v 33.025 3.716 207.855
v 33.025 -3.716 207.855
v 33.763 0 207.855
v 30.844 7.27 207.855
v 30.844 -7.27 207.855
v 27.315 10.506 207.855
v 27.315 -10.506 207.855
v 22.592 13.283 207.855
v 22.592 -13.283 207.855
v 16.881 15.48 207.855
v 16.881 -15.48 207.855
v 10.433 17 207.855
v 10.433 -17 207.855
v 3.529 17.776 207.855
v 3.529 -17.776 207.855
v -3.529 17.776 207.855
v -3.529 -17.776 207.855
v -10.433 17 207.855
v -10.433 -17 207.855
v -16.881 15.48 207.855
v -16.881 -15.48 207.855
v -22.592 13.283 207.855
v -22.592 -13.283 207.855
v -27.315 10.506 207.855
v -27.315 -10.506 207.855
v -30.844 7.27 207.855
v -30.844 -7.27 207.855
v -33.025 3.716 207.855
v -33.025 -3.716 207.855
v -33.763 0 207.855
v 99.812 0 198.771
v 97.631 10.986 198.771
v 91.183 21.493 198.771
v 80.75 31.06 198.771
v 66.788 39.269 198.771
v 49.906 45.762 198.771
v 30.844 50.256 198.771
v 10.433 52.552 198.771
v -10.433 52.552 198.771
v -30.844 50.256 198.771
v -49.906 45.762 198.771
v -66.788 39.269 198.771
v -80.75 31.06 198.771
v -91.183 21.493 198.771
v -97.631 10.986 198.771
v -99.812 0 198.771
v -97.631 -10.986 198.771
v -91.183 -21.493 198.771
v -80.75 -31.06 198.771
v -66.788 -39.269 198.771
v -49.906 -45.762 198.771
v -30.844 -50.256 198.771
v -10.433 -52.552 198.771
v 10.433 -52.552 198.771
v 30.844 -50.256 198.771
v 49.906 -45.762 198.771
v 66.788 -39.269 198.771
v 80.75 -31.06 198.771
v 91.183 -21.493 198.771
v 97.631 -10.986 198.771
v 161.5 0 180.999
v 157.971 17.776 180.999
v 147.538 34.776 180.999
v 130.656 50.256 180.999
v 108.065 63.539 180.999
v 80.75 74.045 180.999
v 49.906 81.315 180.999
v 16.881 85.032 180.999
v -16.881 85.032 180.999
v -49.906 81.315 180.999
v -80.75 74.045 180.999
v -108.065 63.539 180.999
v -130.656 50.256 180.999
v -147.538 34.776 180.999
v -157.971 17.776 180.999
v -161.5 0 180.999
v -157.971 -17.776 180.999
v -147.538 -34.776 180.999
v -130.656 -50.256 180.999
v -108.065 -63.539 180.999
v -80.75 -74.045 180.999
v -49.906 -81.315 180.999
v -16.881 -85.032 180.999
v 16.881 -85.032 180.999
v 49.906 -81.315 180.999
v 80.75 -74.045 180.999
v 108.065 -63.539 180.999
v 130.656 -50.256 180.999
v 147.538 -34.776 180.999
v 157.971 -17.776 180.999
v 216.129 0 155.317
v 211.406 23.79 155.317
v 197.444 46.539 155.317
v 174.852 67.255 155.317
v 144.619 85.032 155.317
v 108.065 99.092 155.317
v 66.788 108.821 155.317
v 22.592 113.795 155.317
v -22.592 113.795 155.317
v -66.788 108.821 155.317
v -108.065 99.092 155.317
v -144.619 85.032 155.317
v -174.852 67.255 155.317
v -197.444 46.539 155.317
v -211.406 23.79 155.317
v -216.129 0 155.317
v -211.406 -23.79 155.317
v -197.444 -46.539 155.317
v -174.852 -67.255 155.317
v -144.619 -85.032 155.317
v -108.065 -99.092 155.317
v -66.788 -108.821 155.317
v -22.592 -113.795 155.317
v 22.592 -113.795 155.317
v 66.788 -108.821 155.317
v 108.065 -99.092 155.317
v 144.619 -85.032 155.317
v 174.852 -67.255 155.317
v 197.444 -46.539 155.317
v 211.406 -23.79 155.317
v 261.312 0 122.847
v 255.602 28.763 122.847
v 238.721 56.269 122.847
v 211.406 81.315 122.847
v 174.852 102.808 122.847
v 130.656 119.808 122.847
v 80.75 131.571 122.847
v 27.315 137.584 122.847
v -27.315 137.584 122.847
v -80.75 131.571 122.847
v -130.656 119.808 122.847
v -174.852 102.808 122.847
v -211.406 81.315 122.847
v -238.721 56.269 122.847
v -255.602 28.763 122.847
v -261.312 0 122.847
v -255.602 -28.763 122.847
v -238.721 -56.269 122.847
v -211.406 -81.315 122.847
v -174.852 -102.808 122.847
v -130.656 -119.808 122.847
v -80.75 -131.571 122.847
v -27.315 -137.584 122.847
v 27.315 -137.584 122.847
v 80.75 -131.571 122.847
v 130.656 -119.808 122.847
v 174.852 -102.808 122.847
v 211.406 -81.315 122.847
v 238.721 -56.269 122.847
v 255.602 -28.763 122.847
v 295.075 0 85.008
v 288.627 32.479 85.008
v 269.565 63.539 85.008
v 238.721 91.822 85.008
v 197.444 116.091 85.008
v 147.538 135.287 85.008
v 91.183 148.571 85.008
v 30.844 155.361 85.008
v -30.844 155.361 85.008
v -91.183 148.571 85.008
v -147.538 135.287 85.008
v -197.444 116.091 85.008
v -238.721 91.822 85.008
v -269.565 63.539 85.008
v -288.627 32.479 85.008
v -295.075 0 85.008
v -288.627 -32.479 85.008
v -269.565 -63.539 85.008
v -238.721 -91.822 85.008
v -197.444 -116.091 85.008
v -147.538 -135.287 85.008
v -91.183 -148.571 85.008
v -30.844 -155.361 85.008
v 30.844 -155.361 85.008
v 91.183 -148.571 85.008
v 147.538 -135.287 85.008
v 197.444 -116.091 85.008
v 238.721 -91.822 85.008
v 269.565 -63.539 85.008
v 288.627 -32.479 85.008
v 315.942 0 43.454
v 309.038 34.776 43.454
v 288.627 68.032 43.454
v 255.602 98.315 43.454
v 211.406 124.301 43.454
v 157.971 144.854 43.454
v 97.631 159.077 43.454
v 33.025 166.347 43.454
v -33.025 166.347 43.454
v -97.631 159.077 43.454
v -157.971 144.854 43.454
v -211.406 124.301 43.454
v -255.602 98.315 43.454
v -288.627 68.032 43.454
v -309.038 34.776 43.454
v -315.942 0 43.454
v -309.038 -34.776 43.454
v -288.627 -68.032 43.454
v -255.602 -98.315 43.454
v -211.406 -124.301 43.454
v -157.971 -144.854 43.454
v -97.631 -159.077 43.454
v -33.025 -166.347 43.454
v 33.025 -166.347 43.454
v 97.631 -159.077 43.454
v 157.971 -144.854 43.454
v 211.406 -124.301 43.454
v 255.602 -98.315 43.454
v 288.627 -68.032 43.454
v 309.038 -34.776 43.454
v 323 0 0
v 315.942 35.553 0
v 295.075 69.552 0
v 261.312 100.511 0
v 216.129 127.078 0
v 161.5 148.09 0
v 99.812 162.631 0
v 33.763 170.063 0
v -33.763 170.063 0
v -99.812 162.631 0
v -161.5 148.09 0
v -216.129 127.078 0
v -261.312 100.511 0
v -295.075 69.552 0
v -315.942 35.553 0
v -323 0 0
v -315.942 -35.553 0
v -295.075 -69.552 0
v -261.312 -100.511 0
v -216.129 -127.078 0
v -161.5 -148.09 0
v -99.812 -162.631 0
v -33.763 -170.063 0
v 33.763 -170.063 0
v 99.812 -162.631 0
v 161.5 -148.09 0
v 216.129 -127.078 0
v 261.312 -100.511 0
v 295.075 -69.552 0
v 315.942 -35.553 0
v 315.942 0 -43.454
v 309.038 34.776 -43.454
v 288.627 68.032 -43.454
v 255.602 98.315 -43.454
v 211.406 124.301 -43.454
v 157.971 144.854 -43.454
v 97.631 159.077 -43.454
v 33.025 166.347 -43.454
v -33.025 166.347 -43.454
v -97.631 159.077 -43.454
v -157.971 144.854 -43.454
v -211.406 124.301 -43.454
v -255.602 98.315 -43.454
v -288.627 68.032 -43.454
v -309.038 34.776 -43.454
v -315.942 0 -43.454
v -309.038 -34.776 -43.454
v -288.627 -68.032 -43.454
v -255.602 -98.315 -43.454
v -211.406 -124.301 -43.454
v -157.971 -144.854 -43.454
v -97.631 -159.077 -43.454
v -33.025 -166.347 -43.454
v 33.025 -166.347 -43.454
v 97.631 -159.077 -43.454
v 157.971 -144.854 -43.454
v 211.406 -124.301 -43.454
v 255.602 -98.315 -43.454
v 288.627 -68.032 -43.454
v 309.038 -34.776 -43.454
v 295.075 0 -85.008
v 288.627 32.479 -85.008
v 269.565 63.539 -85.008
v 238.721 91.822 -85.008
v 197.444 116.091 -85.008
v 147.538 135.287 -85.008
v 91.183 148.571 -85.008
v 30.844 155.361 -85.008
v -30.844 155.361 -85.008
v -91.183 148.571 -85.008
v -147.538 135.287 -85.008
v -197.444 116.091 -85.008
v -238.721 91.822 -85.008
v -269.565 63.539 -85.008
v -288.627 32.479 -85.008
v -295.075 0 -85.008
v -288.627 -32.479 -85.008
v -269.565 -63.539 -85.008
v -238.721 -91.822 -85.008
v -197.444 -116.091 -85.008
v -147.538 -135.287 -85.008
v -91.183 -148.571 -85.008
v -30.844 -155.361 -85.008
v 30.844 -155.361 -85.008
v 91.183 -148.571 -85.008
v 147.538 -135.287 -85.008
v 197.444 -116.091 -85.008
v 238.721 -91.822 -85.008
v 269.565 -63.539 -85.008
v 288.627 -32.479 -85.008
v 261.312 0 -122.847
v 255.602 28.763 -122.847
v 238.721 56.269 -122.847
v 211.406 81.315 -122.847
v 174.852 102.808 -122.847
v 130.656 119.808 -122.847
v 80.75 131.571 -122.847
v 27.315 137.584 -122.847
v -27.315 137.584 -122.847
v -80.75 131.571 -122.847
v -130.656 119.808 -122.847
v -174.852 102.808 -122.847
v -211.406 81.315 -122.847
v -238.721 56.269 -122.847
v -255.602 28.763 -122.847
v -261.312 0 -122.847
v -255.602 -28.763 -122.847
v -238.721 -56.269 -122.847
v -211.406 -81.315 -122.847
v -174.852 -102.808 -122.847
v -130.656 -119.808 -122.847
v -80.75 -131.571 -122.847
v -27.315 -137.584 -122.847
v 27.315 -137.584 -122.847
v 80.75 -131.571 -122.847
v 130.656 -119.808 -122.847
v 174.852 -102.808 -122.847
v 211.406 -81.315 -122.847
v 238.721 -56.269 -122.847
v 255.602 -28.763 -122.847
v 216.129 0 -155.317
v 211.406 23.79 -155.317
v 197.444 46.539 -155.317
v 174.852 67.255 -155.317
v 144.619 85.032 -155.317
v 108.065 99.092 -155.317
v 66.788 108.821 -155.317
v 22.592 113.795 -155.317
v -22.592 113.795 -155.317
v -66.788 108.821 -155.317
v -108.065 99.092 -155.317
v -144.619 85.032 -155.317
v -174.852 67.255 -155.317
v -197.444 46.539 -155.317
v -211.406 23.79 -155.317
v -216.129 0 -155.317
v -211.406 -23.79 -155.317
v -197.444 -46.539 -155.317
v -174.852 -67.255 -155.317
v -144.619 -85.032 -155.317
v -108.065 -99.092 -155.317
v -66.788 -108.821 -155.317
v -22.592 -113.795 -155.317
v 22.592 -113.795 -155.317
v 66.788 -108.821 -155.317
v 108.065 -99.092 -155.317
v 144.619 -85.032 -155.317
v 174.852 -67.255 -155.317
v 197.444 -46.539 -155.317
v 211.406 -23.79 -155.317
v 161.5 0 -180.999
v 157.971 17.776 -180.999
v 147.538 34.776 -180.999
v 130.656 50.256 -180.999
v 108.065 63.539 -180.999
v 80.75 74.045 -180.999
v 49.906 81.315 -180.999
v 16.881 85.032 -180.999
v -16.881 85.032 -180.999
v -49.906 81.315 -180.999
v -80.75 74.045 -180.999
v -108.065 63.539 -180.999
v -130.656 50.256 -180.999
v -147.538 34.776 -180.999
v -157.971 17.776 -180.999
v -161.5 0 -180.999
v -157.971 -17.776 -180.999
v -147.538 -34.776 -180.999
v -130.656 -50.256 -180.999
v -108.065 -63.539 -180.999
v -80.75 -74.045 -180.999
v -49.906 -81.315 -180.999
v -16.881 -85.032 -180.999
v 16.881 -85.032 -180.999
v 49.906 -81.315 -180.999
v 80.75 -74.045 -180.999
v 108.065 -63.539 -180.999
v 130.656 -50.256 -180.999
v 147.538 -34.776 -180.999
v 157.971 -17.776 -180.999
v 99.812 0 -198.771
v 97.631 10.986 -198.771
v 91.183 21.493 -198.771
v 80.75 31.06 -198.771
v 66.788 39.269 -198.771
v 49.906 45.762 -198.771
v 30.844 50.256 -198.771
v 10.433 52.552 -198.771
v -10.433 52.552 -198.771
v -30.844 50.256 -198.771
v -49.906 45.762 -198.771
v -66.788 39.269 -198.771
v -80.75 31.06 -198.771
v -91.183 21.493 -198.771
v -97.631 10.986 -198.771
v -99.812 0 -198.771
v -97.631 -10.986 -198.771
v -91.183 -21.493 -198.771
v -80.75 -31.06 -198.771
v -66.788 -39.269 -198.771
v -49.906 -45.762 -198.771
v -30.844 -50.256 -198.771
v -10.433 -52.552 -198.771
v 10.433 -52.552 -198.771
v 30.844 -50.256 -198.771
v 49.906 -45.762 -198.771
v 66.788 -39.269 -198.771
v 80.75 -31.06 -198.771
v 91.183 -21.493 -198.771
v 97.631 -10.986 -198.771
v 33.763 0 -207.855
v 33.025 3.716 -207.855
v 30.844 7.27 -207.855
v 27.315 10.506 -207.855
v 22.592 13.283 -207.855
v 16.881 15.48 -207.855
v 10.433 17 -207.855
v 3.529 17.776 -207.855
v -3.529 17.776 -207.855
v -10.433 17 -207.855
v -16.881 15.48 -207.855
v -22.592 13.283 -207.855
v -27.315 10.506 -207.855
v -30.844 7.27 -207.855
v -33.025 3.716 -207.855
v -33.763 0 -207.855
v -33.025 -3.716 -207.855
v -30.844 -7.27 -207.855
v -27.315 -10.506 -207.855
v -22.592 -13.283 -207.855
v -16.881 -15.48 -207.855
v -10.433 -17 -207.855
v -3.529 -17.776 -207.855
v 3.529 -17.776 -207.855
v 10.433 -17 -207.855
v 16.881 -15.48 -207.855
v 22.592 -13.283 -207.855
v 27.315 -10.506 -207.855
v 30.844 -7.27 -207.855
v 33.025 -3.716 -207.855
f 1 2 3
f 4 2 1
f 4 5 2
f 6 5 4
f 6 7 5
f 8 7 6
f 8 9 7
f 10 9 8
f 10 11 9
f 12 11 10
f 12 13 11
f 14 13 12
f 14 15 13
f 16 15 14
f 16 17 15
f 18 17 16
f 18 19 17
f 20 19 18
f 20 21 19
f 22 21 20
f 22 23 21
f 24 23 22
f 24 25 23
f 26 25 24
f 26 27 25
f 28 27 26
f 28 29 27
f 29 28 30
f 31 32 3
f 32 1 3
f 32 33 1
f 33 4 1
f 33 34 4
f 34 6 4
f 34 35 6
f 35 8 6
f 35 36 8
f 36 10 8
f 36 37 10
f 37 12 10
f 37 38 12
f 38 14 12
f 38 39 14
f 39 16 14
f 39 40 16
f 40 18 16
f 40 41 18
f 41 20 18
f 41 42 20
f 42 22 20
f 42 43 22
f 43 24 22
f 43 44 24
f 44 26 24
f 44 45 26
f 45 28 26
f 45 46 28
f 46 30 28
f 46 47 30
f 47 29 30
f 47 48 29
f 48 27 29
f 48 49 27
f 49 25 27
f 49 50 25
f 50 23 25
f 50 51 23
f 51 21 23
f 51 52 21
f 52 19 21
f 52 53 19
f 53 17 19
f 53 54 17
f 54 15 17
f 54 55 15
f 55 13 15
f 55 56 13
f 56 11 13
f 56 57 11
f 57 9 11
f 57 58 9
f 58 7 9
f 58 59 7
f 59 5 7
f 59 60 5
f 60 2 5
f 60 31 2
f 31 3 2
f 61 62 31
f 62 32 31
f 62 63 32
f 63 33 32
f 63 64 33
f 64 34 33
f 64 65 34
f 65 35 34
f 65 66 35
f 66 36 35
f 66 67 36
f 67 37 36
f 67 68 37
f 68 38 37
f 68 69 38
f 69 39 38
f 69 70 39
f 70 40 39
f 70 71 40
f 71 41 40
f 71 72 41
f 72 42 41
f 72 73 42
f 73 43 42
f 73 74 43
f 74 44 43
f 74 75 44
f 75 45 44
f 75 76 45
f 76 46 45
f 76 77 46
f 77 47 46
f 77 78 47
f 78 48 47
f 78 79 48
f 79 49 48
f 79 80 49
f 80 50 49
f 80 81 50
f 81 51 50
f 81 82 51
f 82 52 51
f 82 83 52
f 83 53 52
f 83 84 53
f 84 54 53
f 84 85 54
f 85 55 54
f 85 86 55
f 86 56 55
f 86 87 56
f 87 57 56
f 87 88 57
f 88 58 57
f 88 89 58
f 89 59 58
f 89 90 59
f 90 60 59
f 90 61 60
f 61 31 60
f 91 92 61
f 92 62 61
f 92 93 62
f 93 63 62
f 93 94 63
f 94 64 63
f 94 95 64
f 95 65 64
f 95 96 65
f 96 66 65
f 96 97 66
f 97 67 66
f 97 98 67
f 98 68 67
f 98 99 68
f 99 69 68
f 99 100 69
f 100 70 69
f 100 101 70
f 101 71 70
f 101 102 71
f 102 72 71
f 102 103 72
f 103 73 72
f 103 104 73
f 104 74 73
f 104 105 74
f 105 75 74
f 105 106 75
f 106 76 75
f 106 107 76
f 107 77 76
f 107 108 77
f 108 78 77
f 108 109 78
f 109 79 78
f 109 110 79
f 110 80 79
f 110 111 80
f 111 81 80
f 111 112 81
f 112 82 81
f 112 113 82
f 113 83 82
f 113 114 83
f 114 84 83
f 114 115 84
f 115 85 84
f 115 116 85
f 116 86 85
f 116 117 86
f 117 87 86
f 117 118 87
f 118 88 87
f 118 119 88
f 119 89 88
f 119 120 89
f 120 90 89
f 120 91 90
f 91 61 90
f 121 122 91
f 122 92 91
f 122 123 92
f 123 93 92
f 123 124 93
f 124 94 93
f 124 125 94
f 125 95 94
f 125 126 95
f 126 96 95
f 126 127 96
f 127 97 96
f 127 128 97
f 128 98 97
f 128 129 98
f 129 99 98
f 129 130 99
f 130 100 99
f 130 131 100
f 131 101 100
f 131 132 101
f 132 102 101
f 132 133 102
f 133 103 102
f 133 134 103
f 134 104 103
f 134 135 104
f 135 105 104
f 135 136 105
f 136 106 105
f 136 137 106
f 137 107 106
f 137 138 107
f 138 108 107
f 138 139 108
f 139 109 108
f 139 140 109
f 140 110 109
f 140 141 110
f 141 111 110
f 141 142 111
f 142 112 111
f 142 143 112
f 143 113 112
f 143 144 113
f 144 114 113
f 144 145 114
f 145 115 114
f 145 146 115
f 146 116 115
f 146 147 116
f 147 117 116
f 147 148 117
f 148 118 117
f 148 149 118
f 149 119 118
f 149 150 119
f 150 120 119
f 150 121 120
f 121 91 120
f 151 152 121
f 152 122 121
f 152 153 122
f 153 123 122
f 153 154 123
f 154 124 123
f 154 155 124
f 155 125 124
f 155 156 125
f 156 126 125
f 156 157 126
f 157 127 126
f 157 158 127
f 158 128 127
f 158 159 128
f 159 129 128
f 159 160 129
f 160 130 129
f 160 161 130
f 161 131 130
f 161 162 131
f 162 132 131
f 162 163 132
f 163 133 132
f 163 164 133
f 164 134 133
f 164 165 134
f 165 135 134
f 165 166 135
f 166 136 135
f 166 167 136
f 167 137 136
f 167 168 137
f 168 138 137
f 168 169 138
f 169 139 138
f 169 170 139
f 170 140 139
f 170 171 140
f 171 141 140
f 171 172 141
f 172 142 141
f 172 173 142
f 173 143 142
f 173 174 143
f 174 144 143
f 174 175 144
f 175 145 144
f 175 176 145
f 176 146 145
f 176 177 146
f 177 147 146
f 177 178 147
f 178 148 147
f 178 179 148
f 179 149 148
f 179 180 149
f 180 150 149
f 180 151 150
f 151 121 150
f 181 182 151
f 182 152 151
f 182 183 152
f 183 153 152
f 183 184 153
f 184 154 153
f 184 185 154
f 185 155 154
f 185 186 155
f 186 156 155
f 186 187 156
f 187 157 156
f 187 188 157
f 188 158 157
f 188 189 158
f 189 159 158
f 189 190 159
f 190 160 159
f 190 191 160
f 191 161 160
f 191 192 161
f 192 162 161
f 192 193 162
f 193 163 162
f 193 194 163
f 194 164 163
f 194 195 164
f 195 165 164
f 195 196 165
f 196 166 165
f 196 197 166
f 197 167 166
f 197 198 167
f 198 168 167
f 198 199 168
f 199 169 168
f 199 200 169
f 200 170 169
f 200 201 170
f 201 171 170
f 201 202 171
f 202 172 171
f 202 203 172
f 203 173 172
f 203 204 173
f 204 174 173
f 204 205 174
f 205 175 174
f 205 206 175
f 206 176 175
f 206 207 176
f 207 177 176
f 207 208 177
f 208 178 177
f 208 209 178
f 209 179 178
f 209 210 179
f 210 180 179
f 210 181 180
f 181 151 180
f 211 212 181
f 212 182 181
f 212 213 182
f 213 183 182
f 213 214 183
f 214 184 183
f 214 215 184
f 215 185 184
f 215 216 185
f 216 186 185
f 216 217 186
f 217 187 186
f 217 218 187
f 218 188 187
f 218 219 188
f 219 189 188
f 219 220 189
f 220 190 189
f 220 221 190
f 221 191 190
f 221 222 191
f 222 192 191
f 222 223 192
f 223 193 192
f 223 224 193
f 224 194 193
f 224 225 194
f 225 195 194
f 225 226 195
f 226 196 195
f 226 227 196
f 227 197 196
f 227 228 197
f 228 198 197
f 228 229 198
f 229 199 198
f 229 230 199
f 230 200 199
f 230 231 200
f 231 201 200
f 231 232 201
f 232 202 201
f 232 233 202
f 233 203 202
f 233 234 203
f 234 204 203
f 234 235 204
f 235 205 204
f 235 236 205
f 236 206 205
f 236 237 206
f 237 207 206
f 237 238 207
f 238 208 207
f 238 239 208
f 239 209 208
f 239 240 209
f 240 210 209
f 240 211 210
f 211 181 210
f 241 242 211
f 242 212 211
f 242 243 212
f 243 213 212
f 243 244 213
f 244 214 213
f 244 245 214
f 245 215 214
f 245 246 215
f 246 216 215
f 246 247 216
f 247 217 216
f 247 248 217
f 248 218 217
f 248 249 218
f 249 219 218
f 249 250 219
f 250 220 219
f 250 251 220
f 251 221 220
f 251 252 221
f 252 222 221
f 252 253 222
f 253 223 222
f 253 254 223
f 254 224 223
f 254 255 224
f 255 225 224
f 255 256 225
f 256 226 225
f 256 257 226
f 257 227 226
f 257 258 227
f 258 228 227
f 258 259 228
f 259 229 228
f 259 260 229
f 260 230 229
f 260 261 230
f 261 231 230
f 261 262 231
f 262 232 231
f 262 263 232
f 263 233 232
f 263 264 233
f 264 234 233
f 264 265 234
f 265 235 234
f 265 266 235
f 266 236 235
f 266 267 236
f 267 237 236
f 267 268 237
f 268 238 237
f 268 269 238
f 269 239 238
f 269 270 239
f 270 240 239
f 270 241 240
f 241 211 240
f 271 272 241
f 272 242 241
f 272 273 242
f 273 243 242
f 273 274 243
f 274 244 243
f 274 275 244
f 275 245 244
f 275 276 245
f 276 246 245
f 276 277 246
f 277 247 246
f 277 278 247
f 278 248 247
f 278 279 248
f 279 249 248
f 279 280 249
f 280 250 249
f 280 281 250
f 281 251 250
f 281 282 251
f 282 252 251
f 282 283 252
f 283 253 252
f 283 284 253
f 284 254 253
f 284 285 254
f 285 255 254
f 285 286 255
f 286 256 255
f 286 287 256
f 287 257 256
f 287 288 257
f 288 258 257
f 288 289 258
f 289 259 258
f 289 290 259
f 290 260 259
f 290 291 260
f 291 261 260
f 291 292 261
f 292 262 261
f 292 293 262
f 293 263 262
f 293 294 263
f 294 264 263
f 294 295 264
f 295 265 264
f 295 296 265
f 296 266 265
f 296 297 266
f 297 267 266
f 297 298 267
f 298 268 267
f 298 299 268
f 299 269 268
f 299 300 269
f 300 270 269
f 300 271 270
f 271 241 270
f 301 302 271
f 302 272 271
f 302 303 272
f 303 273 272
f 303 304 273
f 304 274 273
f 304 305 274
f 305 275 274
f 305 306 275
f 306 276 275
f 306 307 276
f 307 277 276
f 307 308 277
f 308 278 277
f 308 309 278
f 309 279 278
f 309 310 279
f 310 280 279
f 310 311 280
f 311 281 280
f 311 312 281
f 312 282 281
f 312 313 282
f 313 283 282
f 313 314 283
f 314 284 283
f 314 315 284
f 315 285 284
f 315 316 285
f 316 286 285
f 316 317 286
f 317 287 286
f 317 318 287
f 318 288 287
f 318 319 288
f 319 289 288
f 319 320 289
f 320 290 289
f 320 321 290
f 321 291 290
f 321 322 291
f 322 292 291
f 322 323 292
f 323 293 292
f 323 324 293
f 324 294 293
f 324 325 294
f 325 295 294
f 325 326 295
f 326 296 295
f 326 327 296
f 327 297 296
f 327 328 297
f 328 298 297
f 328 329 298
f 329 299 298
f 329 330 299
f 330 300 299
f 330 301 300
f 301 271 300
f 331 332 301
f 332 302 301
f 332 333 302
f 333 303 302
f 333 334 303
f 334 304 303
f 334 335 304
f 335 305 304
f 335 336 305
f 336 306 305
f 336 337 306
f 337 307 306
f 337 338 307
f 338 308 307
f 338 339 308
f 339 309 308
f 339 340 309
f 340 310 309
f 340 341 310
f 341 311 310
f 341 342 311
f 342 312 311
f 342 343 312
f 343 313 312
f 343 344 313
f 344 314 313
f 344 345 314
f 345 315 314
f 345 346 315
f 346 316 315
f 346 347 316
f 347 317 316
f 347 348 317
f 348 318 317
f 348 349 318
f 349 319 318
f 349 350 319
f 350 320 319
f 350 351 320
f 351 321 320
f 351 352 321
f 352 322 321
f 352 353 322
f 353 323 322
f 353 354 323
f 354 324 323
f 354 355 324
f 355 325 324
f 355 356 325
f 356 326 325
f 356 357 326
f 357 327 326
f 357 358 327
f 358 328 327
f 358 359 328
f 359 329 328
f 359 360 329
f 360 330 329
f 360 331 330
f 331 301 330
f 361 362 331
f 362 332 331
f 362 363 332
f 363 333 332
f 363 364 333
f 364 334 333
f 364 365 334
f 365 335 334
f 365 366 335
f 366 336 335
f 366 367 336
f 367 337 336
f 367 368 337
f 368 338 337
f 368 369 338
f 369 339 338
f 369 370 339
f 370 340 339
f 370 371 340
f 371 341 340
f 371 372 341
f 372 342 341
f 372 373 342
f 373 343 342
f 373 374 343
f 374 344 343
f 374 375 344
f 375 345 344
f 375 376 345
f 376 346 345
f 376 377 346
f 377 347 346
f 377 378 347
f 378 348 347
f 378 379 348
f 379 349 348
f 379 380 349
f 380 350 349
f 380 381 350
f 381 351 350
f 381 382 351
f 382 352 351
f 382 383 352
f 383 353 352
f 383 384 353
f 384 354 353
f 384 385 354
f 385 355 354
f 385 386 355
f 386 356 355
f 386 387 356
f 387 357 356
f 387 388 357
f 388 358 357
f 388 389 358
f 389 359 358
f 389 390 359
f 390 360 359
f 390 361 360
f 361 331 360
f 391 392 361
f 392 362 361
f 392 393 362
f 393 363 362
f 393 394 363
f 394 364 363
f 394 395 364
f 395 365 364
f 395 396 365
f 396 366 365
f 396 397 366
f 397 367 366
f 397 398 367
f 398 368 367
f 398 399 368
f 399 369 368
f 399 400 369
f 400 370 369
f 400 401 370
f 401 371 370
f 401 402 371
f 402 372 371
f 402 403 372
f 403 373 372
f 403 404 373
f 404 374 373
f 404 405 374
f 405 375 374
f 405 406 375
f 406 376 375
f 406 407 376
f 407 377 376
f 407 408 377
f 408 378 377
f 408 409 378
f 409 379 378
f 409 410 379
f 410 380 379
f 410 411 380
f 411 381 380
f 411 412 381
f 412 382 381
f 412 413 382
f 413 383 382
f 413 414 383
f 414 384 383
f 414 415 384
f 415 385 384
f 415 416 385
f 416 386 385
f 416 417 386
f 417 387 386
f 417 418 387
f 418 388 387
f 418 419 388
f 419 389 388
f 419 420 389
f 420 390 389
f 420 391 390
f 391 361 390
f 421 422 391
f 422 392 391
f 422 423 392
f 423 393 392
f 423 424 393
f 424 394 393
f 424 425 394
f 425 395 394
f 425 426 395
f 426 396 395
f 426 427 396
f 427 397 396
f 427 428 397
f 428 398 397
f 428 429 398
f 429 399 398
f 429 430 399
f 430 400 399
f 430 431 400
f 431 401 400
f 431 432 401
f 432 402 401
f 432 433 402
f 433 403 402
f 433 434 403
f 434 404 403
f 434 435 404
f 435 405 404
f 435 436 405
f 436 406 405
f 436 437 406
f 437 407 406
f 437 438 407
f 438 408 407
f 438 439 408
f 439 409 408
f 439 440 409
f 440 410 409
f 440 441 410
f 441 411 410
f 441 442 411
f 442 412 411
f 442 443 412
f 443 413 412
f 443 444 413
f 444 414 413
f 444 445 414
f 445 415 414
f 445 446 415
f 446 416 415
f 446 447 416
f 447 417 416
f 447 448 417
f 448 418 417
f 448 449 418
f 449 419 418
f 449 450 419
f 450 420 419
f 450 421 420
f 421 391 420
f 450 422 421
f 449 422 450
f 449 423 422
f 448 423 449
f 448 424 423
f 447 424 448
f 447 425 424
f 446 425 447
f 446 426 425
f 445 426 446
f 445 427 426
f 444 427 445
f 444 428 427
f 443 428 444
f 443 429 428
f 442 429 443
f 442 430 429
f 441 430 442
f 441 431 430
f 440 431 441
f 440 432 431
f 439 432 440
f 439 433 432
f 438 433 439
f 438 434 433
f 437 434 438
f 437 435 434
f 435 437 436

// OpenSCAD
// Generated by SolidPython 1.0.1 on 2020-07-29 00:46:53


scale(v = [17, 9, 11]) {
	sphere(r = 19);
}
/***********************************************
*********      SolidPython code:      **********
************************************************
 
# import packages: SolidPython
from solid import *
from solid.utils import *
from itertools import chain, combinations, permutations


class Resize:

    def __init__(self, scad_file):
        self.scad_file = scad_file
        #self.scad_file = import_scad(scad_file)
        # cone/cylinder param:
        self.r1 = 0
        self.r2 = 0
        self.h = 0
        # rectangular prism param:
        self.w = 0
        self.l = 0
        # ellipse param:
        self.r = 0

    # import OpenScad code (file name corresponds to shape)


    # classify shape + parameters
    def assign(self, param1, param2, param3):
        if self.scad_file == 'cone.scad':
            self.r1 = param1
            self.r2 = param2
            self.h = param3
        elif self.scad_file == 'cylinder.scad':
            self.r1 = param1
            self.r2 = param2
            self.h = param3
        elif self.scad_file == 'rectangularPrism.scad':
            self.h = param1
            self.l = param2
            self.w = param3
        else:
            self.r = param1
            self.h = param2

    # resize parameters
    def iterate(self):
        x = range(3, 20, 2)
        i = 1
        if self.scad_file == 'cone.scad':
            tempList = list(permutations(x, 2))
            for temp in tempList:
                param1 = temp[0]
                param2 = temp[1]
                filepath = 'produced_scad_files/' + 'cone' + str(param1) + '_' + str(param2) + '_' + '.scad'
                scad_render_to_file(cylinder(h=param1, r1=param2, r2=0), filepath)

        elif self.scad_file == 'cylinder.scad':
            tempList = list(permutations(x, 3))
            for temp in tempList:
                param1 = temp[0]
                param2 = temp[1]
                filepath = 'produced_scad_files/' + 'cylinder' + str(param1) + '_' + str(param2) + '_' + '.scad'
                scad_render_to_file(cylinder(h=param1, r1=param2, r2=param2), filepath)

        elif self.scad_file == 'rectangularPrism.scad':
            tempList = list(permutations(x, 3))
            for temp in tempList:
                param1 = temp[0]
                param2 = temp[1]
                param3 = temp[2]
                filepath = 'produced_scad_files/' + 'rectangularPrism' + str(param1) + '_' + str(param2) + '_' + str(
                    param3) + '.scad'
                scad_render_to_file(cube(size=(param1, param2, param3)), filepath)

        elif self.scad_file == 'ellipse.scad':
            tempList = list(permutations(x, 4))
            for temp in tempList:
                param1 = temp[0]
                param2 = temp[1]
                param3 = temp[2]
                param4 = temp[3]
                filepath = 'produced_scad_files/' + 'ellipse' + str(param1) + '_' + str(param2) + '_' + str(param3) + '_' + str(param4) + '.scad'
                scad_render_to_file(scale([param1, param2, param3])(sphere(r=param4)), filepath)

    def render_to_scadfile(self):
        scad_render_to_file(scad, 'example.scad') 
 
************************************************/
